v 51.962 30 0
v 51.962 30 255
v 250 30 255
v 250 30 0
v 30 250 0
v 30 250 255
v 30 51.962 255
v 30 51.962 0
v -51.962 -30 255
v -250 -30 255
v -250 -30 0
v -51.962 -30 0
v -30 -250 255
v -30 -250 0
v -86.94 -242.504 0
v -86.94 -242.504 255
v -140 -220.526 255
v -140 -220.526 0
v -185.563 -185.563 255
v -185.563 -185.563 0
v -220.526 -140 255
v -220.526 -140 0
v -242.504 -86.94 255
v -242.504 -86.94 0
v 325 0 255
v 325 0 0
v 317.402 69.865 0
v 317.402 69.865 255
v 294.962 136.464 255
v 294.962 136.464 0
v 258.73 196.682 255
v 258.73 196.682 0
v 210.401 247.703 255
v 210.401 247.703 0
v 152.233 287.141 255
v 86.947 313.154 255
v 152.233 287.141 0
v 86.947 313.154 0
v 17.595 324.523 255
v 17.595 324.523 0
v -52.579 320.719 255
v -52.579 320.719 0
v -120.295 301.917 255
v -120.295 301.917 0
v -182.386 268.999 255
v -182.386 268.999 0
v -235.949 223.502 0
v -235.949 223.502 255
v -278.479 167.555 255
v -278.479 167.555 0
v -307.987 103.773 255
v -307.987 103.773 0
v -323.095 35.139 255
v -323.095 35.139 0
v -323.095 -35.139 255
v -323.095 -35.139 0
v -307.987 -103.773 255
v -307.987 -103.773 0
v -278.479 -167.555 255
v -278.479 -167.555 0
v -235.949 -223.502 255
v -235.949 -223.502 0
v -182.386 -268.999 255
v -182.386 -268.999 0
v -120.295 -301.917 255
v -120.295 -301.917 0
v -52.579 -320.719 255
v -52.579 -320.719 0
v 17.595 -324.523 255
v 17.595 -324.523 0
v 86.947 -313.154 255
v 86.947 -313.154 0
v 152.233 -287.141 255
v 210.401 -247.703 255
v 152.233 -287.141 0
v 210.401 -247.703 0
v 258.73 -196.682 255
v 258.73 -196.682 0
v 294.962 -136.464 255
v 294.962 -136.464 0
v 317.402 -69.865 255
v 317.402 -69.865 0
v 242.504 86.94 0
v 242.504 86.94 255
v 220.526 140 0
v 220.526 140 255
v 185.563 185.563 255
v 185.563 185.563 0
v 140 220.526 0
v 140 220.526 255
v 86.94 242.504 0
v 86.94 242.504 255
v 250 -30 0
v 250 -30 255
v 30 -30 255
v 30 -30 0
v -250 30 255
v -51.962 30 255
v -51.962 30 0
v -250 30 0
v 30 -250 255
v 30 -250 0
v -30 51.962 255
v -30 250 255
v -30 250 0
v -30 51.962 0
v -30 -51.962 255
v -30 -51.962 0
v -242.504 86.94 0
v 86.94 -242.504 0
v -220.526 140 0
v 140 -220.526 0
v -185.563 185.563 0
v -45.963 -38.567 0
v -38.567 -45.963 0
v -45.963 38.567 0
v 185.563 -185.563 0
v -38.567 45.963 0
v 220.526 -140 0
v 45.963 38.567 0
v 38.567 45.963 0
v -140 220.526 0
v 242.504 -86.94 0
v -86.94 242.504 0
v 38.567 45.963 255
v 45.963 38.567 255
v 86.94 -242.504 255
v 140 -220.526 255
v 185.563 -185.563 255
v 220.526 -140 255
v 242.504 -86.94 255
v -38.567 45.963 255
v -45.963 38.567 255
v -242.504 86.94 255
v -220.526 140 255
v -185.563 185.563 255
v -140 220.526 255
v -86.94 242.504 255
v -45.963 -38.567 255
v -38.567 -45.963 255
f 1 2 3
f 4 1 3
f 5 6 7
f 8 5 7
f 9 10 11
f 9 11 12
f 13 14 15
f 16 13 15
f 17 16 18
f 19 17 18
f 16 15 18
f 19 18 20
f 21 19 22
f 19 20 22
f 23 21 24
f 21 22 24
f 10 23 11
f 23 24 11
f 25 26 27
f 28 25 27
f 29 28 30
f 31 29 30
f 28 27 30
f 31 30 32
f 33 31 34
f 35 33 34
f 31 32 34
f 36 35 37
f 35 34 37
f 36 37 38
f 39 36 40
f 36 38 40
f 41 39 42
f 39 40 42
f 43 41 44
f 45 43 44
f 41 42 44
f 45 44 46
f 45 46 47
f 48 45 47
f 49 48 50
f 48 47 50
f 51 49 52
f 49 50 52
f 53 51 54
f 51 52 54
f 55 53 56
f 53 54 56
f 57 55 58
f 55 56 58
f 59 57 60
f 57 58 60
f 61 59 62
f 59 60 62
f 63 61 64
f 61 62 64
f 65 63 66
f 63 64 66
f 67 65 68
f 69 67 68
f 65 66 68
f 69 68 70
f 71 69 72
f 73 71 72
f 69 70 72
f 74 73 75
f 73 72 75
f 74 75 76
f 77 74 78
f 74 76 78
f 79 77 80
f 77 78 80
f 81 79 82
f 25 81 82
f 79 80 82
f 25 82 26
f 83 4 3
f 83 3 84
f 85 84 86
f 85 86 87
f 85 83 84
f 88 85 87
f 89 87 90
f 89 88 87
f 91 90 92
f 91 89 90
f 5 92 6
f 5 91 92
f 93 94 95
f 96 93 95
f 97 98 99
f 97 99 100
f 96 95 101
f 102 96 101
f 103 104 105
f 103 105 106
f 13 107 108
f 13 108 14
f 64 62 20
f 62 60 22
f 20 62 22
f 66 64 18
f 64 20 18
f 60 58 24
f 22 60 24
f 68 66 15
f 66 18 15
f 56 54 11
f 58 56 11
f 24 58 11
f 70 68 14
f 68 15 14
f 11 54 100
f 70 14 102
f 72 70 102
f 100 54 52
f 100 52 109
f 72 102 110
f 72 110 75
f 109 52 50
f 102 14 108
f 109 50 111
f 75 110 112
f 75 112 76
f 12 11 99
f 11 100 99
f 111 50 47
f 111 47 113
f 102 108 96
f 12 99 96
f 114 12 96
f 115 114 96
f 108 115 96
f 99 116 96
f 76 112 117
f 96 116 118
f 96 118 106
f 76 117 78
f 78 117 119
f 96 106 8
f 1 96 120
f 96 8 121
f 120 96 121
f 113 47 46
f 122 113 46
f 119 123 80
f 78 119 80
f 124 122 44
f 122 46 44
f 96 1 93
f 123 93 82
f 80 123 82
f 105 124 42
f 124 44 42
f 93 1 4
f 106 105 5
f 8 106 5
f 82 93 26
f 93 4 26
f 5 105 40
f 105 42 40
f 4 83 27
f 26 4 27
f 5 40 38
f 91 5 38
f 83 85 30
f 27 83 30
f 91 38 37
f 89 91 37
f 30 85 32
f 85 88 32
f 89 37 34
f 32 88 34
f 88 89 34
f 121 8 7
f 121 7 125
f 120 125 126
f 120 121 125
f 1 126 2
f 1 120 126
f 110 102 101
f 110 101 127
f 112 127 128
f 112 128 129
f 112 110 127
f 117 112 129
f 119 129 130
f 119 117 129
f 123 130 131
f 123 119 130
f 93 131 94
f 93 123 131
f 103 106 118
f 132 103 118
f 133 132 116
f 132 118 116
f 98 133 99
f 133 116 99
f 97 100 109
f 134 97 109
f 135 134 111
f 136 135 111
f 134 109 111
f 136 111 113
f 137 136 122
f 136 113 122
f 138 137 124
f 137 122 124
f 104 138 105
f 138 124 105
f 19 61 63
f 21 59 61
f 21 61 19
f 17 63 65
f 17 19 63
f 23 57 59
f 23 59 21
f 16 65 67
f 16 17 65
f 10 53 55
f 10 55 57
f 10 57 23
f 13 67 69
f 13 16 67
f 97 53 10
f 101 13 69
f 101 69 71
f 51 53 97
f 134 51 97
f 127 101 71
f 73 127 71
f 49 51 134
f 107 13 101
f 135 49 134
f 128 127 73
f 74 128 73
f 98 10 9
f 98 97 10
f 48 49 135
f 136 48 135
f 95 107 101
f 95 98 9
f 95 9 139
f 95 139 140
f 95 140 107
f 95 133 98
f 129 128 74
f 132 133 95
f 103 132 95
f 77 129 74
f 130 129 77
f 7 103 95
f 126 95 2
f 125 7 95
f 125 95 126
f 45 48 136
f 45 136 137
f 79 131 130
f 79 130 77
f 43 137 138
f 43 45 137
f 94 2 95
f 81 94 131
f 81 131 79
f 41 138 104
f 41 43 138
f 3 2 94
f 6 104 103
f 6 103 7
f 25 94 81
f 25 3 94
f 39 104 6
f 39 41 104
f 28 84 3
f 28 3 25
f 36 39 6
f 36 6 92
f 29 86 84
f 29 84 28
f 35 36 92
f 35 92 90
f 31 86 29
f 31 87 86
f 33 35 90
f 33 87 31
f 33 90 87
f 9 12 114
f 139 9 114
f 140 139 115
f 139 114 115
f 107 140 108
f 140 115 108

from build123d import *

# Parameters (mm, degrees)
SKETCH_1_R          = 325
EXTRUDE_1_DEPTH     = 255
CUT_EXTRUDE_2_DEPTH = 255
CUT_EXTRUDE_3_DEPTH = 255
CUT_EXTRUDE_5_DEPTH = 255
CUT_EXTRUDE_6_DEPTH = 255


with BuildPart() as part:
    # 草图1 → 凸台-拉伸1 (new body)
    with BuildSketch(Plane.XY):
        Circle(SKETCH_1_R)
    extrude(amount=EXTRUDE_1_DEPTH)

    # 草图2 → 切除-拉伸2 (cut)
    with BuildSketch(Plane.XY):
        with BuildLine():
            Line((51.961524227, 30), (250, 30))
            ThreePointArc((250, 30), (185.563491861, 185.563491861), (30, 250))
            Line((30, 250), (30, 51.961524227))
            ThreePointArc((30, 51.961524227), (42.426406871, 42.426406871), (51.961524227, 30))
        make_face()
    extrude(amount=CUT_EXTRUDE_2_DEPTH, mode=Mode.SUBTRACT)

    # 草图3 → 切除-拉伸3 (cut)
    with BuildSketch(Plane.XY):
        with BuildLine():
            Line((-30, 250), (-30, 51.961524227))
            ThreePointArc((-30, 51.961524227), (-42.426406871, 42.426406871), (-51.961524227, 30))
            Line((-51.961524227, 30), (-250, 30))
            ThreePointArc((-250, 30), (-185.563491861, 185.563491861), (-30, 250))
        make_face()
    extrude(amount=CUT_EXTRUDE_3_DEPTH, mode=Mode.SUBTRACT)

    # 草图7 → 切除-拉伸5 (cut)
    with BuildSketch(Plane.XY):
        with BuildLine():
            Line((-30, -51.961524227), (-30, -250))
            ThreePointArc((-30, -250), (-185.563491861, -185.563491861), (-250, -30))
            Line((-250, -30), (-51.961524227, -30))
            ThreePointArc((-51.961524227, -30), (-42.426406871, -42.426406871), (-30, -51.961524227))
        make_face()
    extrude(amount=CUT_EXTRUDE_5_DEPTH, mode=Mode.SUBTRACT)

    # 草图8 → 切除-拉伸6 (cut)
    with BuildSketch(Plane.XY):
        with BuildLine():
            Line((30, -30), (30, -250))
            ThreePointArc((30, -250), (185.563491861, -185.563491861), (250, -30))
            Line((250, -30), (30, -30))
        make_face()
    extrude(amount=CUT_EXTRUDE_6_DEPTH, mode=Mode.SUBTRACT)


solid = part.part
